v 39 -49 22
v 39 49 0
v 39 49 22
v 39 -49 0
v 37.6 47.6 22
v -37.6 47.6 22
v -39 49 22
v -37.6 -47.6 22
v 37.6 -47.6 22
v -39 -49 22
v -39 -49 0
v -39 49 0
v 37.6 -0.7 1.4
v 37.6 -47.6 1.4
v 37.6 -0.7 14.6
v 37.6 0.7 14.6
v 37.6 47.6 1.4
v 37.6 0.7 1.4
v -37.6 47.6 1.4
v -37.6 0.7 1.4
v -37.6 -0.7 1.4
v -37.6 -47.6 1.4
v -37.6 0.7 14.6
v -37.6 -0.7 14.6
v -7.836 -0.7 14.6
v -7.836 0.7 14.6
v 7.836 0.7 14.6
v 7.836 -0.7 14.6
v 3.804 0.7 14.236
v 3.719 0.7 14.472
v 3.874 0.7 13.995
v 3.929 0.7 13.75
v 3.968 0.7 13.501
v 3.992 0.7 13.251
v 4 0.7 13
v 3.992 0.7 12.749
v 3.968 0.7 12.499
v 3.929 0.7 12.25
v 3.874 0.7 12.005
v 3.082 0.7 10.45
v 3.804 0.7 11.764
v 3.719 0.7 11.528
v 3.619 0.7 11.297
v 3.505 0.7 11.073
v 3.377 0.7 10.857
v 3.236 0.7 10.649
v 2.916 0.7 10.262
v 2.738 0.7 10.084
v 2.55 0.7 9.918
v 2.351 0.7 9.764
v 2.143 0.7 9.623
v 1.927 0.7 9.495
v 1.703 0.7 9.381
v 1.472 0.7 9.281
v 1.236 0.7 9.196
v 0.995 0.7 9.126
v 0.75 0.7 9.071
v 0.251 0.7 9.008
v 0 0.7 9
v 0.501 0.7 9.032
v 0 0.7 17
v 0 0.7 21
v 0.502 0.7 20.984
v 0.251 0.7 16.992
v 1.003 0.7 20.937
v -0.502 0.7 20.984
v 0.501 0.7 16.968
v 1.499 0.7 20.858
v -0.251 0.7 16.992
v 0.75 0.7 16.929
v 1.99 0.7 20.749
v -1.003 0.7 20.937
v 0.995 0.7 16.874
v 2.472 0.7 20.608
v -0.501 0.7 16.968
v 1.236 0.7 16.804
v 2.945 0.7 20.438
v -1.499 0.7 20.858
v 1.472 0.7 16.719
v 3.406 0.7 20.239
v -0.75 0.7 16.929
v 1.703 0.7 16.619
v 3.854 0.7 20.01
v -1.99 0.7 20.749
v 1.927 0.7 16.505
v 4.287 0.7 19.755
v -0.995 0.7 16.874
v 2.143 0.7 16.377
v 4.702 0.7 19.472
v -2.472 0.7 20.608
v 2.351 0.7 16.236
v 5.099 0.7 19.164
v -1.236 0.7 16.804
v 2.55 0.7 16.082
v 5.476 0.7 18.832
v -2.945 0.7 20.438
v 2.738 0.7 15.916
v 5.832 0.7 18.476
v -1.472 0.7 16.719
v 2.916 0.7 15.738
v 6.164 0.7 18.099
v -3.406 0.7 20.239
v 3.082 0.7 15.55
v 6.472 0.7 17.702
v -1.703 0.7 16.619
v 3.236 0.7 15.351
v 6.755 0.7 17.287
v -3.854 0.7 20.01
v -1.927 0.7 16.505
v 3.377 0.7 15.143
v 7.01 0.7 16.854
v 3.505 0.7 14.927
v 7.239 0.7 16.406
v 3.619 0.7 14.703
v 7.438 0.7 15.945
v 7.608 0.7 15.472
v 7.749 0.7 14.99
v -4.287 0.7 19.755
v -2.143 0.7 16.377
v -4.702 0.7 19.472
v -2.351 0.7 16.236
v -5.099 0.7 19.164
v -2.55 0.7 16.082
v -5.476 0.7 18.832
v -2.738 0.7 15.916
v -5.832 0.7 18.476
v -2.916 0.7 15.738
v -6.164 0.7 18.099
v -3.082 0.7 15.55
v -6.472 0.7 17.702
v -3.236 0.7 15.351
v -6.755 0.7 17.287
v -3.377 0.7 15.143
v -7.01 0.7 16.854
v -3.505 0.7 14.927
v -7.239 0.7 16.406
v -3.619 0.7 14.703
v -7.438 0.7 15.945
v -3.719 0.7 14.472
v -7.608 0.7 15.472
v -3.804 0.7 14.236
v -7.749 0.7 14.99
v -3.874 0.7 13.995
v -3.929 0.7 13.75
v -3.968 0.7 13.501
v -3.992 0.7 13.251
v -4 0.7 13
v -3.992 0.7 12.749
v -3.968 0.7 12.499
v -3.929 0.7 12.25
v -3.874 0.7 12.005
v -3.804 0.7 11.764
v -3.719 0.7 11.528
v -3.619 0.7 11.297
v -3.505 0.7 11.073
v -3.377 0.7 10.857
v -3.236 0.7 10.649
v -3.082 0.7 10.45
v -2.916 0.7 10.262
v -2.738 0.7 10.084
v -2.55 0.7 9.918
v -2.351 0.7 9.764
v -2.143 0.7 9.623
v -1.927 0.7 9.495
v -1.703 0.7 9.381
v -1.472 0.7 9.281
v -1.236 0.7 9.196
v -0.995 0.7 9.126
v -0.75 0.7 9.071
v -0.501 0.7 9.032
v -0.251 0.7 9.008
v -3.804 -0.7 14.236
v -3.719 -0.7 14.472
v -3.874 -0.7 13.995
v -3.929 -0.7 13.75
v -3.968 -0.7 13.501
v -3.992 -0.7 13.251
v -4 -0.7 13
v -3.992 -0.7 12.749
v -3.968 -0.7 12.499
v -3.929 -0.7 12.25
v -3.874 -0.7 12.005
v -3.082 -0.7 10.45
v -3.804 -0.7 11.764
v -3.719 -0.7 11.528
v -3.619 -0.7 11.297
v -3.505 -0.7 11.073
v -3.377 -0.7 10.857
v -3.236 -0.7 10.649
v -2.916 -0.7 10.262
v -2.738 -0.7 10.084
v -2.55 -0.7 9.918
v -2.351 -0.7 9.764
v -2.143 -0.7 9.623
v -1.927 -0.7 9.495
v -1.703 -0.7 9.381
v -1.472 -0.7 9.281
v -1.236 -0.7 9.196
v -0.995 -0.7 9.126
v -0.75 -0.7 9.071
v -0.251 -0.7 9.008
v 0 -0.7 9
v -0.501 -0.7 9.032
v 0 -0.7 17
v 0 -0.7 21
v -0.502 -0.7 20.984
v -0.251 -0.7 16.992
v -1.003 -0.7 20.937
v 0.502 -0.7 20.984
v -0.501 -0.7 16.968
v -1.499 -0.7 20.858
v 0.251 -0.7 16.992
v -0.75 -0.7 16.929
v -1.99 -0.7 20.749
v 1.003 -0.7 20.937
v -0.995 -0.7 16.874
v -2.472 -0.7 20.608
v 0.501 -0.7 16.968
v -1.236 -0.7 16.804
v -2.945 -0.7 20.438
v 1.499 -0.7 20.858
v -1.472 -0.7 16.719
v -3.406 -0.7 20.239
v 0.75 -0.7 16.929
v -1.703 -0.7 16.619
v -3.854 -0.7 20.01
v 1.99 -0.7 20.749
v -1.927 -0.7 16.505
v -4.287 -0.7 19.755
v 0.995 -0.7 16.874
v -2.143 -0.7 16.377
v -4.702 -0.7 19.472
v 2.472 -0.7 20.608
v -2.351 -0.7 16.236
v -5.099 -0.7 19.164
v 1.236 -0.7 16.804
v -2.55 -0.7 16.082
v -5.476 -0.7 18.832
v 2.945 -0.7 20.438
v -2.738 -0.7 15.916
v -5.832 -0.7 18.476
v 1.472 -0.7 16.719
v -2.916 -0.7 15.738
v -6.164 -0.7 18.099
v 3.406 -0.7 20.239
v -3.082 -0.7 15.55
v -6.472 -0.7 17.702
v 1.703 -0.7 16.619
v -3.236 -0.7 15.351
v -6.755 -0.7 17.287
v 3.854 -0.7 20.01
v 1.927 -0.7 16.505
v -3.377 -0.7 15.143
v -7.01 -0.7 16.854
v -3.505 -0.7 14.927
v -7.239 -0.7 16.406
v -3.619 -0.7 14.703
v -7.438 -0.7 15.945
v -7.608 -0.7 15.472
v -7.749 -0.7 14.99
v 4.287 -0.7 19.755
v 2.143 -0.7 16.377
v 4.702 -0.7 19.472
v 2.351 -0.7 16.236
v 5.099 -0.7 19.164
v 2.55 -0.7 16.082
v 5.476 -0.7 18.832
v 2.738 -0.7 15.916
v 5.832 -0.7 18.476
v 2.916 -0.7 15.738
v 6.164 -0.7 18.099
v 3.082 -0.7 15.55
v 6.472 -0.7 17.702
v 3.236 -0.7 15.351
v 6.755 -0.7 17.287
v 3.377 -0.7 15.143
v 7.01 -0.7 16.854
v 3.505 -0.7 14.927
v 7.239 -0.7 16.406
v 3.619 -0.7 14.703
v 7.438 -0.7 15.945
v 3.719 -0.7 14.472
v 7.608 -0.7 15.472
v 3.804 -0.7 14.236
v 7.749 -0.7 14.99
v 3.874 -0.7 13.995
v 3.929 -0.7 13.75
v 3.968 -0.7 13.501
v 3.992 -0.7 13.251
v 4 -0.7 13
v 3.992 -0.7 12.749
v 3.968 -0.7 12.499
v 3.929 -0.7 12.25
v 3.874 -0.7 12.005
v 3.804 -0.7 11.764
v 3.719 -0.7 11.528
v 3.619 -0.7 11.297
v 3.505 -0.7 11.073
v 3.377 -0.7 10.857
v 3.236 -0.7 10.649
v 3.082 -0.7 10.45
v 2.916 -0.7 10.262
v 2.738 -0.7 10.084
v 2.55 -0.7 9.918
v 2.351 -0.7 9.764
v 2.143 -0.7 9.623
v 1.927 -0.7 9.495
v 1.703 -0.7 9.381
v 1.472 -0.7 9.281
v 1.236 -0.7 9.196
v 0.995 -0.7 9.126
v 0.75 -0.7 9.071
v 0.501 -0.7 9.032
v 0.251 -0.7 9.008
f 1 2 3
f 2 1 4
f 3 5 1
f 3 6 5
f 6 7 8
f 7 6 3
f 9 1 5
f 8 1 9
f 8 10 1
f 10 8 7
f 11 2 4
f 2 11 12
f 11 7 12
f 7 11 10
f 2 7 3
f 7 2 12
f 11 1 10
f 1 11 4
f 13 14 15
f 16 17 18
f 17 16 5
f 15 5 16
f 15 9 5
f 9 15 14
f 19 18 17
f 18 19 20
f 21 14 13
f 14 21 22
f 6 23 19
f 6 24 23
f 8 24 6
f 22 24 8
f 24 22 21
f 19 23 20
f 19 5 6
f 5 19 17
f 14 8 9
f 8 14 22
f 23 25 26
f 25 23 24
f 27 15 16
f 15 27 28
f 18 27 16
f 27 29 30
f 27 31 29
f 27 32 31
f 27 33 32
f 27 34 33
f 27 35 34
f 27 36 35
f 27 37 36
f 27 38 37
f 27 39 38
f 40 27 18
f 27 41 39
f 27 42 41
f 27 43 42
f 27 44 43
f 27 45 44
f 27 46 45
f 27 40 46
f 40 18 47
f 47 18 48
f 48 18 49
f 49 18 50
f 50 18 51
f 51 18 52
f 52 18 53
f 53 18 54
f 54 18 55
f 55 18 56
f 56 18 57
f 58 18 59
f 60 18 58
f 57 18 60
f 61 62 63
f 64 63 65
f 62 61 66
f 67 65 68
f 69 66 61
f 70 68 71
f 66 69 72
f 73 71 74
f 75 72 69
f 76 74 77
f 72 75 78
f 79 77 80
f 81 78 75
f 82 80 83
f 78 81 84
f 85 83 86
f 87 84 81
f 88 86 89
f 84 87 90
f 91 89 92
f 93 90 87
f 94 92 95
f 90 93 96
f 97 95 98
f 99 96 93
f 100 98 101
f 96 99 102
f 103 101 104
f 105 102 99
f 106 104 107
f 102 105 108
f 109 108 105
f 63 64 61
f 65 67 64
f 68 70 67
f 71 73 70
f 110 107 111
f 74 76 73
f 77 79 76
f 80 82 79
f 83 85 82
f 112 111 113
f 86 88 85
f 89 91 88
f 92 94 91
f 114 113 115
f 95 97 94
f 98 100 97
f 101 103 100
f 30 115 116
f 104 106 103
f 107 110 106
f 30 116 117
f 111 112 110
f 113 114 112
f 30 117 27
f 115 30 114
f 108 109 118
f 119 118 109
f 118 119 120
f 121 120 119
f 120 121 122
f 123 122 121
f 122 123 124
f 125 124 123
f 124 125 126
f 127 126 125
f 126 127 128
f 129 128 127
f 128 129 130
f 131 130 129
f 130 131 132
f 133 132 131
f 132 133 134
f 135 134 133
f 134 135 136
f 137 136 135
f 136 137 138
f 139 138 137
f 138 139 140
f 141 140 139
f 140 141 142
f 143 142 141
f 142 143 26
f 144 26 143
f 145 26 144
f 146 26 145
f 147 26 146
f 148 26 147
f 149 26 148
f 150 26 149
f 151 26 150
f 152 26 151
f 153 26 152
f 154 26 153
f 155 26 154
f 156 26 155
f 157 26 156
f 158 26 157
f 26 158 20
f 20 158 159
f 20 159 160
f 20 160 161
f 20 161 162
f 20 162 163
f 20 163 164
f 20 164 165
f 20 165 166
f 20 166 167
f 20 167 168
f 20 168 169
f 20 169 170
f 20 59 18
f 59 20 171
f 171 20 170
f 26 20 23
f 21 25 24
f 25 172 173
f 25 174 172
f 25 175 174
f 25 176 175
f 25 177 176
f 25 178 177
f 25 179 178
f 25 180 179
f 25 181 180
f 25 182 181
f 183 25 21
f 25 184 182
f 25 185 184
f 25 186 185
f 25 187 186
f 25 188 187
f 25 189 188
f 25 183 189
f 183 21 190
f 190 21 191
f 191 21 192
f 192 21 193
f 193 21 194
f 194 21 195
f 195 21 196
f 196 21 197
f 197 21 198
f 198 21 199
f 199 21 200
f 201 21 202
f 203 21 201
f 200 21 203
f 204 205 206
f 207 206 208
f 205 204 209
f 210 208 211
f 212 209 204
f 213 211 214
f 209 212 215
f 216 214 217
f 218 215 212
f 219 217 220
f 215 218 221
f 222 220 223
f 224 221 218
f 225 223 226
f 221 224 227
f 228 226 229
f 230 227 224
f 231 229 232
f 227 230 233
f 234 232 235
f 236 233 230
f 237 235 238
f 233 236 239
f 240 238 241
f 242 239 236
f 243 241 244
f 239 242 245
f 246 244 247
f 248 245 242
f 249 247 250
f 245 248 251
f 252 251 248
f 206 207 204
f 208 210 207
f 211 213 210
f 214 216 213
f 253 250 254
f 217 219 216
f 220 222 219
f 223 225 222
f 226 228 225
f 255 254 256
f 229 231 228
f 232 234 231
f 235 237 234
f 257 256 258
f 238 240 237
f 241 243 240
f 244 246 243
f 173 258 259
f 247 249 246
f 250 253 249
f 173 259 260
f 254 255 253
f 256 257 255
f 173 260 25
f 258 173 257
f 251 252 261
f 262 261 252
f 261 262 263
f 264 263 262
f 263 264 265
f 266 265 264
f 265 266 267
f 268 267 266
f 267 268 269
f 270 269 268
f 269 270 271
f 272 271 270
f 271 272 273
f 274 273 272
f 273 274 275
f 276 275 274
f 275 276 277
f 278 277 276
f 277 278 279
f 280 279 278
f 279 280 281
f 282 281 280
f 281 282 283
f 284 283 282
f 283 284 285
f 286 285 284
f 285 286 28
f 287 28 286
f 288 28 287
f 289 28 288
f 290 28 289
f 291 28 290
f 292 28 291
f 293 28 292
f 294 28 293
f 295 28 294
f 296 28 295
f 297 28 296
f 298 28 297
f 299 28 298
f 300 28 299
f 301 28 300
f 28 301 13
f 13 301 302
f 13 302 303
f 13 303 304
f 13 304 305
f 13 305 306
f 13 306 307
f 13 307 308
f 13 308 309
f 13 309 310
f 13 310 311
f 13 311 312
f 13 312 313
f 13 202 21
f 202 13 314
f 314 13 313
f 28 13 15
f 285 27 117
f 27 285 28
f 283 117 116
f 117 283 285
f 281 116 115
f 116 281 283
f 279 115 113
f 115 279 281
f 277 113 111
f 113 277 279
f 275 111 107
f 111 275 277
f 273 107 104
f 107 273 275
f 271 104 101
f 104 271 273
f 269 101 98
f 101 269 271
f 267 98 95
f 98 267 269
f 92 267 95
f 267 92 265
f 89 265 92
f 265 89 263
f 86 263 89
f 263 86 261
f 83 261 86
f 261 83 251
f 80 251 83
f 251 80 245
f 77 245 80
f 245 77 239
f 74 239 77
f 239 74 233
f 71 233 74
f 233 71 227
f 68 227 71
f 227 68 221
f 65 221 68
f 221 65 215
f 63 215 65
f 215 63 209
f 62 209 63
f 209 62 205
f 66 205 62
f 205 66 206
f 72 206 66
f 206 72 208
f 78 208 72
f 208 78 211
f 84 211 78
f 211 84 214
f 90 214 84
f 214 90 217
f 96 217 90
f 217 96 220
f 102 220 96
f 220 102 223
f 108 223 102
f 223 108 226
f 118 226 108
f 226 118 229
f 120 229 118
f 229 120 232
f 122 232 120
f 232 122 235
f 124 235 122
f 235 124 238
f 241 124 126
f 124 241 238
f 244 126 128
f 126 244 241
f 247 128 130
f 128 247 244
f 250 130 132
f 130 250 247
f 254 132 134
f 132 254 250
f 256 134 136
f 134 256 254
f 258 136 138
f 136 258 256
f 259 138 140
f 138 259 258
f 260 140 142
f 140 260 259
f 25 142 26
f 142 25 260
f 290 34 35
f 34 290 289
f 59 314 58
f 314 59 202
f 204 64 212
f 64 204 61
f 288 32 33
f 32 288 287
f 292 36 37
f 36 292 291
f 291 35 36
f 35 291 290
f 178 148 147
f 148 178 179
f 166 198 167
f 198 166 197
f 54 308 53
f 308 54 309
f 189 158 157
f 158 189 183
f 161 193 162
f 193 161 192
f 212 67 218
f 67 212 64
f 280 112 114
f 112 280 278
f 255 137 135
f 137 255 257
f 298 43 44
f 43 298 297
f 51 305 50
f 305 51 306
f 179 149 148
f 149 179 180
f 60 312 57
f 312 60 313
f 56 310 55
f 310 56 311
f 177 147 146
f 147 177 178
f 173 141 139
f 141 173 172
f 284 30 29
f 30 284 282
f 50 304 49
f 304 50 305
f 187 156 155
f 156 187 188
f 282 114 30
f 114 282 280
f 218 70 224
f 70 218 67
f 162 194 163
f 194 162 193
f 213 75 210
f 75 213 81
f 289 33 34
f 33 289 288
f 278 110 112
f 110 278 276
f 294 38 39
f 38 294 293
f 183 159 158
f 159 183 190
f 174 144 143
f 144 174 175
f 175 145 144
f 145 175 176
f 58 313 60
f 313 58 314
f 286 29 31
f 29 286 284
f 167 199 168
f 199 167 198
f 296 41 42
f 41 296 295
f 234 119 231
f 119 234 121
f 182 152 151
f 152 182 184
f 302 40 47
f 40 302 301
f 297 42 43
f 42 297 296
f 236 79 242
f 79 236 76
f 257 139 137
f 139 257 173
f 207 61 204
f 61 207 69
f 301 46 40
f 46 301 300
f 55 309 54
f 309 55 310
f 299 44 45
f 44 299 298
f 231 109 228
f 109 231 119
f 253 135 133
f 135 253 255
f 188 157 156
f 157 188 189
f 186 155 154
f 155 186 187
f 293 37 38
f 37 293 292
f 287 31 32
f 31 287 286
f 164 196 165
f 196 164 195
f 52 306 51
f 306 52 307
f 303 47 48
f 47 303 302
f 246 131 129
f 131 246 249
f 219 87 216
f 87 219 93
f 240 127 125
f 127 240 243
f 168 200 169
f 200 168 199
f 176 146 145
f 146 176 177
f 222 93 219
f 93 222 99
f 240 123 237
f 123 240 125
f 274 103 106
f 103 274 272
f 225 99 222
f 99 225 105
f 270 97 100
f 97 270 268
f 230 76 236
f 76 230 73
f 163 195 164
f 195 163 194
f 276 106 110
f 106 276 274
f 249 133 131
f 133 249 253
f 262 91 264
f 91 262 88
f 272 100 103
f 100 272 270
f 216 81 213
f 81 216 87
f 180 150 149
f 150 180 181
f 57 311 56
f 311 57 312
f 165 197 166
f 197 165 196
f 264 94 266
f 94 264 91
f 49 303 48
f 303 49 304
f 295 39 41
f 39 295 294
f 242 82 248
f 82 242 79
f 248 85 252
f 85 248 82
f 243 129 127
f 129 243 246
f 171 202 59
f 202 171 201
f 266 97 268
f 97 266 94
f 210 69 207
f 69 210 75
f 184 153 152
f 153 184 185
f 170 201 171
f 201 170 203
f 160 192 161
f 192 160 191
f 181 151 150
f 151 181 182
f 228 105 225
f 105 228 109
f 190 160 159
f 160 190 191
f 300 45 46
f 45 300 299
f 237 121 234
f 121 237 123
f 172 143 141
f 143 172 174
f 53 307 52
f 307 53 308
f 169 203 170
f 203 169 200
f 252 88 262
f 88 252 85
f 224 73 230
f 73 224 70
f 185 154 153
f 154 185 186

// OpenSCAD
size_divisor = 3;
long_barrier_count = 0;
short_barrier_count = 1;

max_height = 66;

width = 78;
depth = 98;
thickness = 1.4;
height = max_height / size_divisor;
divider_height = 0.6 * height;

holder_inner_diameter = 8;
holder_outer_diameter = 8 + 2*4;
holder_pin_width = 10;
holder_top_space = 1;

holder_pin_height = height - holder_top_space - holder_outer_diameter / 2;
echo(holder_pin_height);

$fn = 100;

translate([-width/2, -depth/2, 0]) {
    difference() {
        cube([width, depth, height]);
        translate([thickness, thickness, thickness]) {
            cube([width - 2*thickness, depth-2*thickness, height]);
        }
    }
}

difference() {
    union() {
        if (long_barrier_count > 1) {
            for (i=[1:long_barrier_count]) let(
                x = i*(width-2*thickness)/(long_barrier_count+1) + thickness/2
            ) {
                translate([-width/2 + x, -depth/2, thickness]) {
                    cube([thickness, depth, divider_height]);
                }
            }
        }

        if (short_barrier_count > 0) {
            for (i=[1:short_barrier_count]) let(
                y = i*(depth-2*thickness)/(short_barrier_count+1) + thickness/2
            ) {
                translate([-width/2, -depth/2 + y, thickness]) {
                    cube([width, thickness, divider_height]);
                }
            }
        }

        translate([0, thickness/2, 0]) {
            rotate([90, 0, 0]) {
                linear_extrude(thickness) {
                    translate([-holder_pin_width/2, 0]) {
                        square([holder_pin_width, holder_pin_height]);
                    }
                    translate([0, holder_pin_height]) {
                        circle(d=holder_outer_diameter);
                    }
                }
            }
        }
    }
    translate([0, thickness/2+1, 0]) {
        rotate([90, 0, 0]) {
            linear_extrude(thickness+2) {
                translate([0, holder_pin_height]) {
                    circle(d=holder_inner_diameter);
                }
            }
        }
    }
}
